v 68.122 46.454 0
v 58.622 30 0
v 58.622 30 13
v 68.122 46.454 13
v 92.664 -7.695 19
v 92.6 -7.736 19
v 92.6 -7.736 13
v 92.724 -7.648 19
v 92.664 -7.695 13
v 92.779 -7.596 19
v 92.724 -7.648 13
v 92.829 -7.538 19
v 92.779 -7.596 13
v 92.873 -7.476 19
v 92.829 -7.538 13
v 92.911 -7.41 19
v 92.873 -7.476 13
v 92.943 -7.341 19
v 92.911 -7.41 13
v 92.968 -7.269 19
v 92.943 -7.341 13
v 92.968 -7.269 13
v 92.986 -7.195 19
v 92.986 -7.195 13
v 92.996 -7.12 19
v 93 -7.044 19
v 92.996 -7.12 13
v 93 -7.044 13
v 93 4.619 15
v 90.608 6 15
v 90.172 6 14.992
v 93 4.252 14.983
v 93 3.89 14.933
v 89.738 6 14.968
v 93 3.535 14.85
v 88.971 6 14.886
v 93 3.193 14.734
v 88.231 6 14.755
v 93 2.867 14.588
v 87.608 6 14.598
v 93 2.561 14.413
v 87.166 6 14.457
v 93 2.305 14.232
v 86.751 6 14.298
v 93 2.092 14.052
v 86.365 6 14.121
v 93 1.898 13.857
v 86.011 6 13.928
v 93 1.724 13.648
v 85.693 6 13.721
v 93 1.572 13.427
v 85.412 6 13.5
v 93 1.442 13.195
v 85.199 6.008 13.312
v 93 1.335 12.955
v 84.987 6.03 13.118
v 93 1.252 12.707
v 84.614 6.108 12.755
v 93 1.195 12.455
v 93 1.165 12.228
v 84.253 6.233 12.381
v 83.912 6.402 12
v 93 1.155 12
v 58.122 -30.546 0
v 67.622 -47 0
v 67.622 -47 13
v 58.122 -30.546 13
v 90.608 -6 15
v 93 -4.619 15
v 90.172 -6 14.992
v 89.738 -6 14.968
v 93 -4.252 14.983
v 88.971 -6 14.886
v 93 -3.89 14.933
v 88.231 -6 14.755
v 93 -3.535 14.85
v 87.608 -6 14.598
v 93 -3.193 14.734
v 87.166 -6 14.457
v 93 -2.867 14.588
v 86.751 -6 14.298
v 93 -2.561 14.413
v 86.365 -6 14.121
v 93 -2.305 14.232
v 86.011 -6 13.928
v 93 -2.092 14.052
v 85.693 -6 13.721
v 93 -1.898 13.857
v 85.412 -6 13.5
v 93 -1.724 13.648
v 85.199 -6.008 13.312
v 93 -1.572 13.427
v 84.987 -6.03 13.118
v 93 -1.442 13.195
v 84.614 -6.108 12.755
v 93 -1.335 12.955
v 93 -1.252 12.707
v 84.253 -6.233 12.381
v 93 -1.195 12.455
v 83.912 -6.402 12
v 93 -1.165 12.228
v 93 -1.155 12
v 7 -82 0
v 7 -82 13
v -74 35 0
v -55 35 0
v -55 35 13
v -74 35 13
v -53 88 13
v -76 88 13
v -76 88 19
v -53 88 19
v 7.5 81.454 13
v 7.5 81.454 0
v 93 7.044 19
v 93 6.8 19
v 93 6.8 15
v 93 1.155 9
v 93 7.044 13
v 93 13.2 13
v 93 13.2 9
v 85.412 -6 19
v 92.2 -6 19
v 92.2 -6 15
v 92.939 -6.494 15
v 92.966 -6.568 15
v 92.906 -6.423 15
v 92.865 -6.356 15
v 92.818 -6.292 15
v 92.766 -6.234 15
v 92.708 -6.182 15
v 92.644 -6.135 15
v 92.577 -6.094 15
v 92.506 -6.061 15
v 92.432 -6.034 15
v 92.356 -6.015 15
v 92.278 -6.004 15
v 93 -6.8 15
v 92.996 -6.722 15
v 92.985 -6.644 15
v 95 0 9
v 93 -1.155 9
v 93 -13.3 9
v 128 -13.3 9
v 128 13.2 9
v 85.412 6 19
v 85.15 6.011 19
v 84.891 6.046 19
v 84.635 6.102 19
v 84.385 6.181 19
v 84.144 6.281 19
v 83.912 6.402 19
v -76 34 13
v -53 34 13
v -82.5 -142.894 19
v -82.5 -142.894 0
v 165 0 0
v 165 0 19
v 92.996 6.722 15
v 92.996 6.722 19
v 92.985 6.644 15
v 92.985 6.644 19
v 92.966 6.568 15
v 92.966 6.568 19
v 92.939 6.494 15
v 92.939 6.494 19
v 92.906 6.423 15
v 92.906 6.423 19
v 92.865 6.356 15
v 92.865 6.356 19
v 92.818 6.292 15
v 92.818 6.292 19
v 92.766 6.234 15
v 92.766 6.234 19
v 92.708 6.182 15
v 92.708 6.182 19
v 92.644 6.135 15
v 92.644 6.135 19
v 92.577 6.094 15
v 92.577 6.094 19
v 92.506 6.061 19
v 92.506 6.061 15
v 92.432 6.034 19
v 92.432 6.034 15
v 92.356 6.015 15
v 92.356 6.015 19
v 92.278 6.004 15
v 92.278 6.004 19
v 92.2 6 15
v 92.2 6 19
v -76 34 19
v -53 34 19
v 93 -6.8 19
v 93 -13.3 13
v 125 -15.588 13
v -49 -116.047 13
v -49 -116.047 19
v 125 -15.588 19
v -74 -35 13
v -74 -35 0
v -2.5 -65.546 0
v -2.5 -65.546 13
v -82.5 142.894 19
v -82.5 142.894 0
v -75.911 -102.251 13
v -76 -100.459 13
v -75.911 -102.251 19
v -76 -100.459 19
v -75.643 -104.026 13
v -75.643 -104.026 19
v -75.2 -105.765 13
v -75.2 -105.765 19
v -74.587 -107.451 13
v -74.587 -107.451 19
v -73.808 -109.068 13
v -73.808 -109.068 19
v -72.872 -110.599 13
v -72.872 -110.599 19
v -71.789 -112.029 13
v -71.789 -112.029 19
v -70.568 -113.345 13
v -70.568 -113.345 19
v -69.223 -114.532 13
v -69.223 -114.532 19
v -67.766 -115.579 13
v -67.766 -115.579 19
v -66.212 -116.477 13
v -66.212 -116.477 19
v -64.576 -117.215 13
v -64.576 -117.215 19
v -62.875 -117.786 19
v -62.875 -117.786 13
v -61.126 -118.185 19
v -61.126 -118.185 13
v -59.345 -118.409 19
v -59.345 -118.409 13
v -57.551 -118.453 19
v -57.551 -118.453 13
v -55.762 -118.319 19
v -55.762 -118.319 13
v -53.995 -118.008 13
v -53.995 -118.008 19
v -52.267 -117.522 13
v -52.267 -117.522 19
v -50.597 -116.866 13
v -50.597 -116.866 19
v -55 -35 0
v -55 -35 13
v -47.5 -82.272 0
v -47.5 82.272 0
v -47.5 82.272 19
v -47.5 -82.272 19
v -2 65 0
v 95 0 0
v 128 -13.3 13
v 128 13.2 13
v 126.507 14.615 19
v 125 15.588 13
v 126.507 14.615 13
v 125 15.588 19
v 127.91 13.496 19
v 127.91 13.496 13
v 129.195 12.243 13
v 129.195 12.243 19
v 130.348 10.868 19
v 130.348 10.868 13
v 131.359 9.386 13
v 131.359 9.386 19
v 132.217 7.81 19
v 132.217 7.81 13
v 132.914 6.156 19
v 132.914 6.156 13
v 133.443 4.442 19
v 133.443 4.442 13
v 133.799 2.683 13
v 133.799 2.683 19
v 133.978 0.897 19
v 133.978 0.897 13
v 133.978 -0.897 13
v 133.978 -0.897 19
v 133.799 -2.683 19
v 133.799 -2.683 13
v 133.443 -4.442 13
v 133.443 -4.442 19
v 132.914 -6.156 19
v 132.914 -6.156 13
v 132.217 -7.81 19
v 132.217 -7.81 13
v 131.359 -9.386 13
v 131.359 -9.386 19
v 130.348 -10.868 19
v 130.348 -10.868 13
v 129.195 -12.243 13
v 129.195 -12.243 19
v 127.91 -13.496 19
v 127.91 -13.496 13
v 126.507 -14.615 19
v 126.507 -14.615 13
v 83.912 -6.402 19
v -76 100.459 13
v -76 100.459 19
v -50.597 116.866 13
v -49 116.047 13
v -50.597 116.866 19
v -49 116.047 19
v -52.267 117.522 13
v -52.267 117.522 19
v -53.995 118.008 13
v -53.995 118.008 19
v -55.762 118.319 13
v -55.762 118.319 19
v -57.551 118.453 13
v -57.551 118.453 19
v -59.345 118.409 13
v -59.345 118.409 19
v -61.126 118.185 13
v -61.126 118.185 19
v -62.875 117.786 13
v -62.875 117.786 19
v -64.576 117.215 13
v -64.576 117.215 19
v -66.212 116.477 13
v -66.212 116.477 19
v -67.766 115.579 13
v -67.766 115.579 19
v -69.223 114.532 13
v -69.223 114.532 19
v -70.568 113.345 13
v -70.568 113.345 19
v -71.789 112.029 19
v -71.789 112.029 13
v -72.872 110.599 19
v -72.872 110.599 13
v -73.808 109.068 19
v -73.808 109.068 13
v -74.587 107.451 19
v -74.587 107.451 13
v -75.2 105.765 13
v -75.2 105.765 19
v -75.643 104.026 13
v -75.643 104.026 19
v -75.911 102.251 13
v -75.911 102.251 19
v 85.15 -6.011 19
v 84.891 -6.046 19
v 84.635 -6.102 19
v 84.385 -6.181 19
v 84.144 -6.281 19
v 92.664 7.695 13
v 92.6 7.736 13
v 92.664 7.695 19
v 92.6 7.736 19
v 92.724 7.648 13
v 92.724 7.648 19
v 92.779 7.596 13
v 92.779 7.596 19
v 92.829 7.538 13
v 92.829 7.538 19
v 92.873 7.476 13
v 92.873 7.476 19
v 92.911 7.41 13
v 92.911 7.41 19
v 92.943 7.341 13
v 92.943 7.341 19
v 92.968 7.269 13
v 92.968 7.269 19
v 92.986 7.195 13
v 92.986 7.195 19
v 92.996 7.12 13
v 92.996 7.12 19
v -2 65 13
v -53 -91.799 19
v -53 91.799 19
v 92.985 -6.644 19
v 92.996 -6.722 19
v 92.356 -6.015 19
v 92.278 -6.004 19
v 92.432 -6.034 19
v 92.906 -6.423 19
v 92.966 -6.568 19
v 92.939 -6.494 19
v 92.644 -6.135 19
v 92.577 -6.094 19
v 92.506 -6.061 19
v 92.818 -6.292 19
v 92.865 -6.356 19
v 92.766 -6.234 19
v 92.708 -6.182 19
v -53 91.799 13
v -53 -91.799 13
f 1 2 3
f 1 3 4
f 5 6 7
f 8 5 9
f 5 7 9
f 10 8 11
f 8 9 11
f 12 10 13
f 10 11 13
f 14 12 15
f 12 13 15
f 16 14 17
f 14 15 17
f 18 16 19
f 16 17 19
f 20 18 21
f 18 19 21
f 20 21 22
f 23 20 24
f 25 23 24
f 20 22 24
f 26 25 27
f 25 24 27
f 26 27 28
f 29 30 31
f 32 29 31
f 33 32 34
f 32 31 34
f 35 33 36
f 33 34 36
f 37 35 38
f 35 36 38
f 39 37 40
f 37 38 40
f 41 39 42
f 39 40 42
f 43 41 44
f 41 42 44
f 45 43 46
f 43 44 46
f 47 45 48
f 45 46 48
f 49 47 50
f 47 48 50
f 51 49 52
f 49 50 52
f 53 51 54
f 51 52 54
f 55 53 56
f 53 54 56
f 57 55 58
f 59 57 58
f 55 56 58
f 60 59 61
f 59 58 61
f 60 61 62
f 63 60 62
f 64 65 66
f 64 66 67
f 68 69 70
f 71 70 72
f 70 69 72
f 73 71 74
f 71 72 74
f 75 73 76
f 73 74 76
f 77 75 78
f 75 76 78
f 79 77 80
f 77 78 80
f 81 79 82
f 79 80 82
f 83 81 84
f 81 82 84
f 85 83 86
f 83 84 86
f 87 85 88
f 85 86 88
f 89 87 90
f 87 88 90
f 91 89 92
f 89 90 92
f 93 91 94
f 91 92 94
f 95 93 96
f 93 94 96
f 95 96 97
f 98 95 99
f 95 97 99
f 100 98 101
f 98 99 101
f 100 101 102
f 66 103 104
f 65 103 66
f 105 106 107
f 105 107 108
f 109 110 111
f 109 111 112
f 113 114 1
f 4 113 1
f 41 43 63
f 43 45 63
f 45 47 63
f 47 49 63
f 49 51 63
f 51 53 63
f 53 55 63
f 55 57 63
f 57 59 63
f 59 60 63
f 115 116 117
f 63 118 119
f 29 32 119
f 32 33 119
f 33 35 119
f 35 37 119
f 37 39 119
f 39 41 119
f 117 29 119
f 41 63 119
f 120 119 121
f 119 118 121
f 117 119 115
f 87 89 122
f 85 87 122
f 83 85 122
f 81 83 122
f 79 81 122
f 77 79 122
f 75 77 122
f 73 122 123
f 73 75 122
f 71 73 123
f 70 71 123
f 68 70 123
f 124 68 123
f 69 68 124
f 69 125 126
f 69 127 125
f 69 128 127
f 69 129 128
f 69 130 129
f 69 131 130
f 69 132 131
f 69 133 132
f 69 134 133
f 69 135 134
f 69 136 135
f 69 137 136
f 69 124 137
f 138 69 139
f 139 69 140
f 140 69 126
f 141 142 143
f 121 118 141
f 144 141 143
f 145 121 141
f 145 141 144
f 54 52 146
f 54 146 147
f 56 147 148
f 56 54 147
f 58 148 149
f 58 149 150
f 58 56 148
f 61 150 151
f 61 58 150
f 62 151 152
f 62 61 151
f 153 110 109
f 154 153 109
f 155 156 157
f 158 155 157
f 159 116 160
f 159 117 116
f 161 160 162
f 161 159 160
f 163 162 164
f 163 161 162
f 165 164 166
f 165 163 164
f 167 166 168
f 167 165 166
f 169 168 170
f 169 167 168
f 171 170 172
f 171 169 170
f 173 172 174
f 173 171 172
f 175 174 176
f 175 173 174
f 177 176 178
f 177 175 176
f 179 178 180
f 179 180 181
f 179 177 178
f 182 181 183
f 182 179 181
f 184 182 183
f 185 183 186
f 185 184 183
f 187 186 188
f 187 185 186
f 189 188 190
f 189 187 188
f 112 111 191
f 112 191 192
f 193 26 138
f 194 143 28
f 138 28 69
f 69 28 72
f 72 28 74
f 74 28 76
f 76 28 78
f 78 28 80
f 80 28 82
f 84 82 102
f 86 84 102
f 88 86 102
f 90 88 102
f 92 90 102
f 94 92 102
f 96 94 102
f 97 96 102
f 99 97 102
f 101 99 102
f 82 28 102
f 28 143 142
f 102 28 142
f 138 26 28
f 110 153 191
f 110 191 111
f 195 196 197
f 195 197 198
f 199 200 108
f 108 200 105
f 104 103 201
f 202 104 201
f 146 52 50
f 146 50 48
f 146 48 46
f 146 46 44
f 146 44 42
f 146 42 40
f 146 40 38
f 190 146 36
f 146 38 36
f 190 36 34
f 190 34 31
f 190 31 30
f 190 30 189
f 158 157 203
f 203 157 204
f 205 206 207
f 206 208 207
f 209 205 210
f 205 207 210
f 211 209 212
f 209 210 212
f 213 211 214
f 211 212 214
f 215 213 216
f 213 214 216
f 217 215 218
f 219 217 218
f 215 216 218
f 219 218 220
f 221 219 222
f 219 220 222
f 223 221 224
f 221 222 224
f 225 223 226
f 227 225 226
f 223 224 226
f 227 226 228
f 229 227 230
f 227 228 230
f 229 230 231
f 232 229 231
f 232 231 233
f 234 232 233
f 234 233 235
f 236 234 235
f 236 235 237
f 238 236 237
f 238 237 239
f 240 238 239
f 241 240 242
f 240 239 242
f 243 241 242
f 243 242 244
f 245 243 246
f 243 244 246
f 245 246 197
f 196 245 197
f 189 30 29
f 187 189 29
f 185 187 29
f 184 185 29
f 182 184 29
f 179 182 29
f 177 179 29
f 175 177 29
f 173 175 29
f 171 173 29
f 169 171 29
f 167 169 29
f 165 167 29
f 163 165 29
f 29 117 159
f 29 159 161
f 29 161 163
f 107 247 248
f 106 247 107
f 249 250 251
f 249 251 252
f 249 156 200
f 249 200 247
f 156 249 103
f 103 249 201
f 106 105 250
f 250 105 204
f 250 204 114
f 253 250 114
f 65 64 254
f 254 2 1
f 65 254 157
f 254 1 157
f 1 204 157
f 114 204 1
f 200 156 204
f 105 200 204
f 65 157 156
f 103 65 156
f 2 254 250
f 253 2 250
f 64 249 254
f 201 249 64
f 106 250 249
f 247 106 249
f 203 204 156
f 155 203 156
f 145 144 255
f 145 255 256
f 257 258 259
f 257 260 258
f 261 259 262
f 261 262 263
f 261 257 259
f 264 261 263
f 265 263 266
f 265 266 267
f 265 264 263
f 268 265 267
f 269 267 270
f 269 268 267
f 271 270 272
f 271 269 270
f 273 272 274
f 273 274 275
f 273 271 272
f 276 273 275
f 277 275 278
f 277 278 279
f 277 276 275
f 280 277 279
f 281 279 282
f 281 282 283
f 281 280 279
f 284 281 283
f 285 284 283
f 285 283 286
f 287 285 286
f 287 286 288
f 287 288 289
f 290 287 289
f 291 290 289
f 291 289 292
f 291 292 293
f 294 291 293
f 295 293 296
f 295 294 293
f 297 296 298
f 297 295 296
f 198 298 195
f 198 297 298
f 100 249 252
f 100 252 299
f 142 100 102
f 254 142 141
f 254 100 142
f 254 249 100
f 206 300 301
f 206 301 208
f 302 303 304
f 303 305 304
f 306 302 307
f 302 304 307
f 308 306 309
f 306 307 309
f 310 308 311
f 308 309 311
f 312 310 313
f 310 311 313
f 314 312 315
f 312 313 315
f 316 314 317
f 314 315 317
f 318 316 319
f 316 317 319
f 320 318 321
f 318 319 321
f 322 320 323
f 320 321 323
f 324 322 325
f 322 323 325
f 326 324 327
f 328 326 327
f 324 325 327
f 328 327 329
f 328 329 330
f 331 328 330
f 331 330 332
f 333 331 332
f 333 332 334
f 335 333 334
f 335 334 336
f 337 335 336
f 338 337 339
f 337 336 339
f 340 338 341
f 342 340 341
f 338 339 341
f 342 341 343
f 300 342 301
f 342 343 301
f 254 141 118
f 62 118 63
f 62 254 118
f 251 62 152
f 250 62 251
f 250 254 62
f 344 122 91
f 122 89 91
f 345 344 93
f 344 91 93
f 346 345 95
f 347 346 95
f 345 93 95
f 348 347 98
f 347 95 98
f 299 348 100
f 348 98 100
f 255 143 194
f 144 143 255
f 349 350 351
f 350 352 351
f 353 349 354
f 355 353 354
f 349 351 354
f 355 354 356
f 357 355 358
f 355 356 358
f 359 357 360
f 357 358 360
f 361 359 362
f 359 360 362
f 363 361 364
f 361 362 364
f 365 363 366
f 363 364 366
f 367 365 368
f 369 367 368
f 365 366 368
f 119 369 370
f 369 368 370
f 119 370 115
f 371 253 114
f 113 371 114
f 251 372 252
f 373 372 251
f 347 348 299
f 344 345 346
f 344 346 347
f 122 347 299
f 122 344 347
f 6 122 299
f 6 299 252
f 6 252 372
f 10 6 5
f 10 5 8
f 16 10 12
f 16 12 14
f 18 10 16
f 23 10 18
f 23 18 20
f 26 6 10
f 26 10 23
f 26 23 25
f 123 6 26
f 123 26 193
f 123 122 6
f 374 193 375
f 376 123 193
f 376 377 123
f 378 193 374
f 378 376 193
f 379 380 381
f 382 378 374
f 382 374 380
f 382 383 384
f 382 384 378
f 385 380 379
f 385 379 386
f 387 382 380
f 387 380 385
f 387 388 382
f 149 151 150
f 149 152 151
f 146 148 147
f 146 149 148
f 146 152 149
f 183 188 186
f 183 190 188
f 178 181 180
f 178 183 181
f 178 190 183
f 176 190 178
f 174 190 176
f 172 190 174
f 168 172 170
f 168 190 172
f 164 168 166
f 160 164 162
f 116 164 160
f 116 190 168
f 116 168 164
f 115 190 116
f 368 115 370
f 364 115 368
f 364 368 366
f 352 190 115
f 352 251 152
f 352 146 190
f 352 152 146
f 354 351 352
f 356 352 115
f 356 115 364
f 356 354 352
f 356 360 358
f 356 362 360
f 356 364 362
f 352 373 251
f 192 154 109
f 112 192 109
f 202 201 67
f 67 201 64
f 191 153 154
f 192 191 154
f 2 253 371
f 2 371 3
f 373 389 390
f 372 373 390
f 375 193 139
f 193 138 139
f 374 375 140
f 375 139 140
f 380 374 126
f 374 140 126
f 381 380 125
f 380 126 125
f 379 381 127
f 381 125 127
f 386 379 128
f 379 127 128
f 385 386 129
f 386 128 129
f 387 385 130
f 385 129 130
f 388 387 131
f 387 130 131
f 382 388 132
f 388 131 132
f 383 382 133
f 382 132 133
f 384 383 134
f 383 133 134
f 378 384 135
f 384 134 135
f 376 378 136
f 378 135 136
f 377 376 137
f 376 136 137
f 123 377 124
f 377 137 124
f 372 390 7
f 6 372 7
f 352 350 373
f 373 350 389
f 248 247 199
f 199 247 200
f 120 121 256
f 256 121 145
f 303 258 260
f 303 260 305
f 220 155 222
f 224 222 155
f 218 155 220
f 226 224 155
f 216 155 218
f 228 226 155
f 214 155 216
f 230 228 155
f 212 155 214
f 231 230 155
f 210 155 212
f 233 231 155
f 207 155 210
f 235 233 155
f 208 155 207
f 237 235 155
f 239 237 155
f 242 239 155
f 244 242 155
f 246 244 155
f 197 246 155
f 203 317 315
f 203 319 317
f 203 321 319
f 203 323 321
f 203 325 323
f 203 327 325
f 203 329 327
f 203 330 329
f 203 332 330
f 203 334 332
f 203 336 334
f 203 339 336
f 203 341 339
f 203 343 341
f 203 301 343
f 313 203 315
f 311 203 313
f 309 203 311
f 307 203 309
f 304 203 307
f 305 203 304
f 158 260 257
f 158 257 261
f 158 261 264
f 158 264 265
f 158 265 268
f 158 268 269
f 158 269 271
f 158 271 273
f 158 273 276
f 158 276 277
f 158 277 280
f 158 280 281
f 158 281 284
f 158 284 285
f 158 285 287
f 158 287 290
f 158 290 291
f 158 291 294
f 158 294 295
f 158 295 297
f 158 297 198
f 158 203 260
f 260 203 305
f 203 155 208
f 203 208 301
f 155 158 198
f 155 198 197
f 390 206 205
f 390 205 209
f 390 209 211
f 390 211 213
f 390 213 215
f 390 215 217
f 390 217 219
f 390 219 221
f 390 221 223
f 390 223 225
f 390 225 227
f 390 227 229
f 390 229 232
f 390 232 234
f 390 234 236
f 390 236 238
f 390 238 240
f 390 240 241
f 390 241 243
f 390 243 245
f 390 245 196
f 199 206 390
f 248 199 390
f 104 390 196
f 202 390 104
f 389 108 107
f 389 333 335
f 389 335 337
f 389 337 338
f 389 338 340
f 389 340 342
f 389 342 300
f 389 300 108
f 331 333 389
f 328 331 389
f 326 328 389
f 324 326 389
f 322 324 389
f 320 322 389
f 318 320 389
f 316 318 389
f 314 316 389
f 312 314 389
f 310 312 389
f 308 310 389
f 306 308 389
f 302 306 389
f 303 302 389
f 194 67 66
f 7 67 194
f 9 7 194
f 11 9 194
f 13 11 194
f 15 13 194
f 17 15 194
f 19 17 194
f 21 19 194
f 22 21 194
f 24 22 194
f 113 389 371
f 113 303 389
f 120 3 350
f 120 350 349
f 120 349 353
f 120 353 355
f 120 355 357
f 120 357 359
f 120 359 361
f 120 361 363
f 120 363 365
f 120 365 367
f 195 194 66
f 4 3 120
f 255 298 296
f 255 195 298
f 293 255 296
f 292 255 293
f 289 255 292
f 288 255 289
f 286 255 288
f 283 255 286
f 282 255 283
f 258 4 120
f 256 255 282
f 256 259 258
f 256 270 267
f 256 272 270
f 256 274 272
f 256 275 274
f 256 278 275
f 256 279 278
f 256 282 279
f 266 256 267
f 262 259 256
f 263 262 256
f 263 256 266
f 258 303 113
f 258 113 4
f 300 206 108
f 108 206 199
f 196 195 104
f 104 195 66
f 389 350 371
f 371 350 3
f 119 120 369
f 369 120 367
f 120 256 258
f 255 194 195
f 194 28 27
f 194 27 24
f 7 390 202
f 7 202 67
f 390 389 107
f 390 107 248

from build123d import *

# Parameters (mm, degrees)
BOX005_W               = 23
BOX005_H               = 54
BOX005_DEPTH           = 6
PRISM003_DEPTH         = 6
PRISM002_DEPTH         = 6
BOX004_W               = 10
BOX004_H               = 12
BOX004_DEPTH           = 4
BOX003_W               = 35
BOX003_H               = 26.5
BOX003_DEPTH           = 10
BOX002_W               = 70
BOX002_H               = 19
BOX002_DEPTH           = 19
BOX002_PLACEMENT_ANGLE = 30
BOX001_W               = 70
BOX001_H               = 19
BOX001_DEPTH           = 19
BOX001_PLACEMENT_ANGLE = 90
BOX_W                  = 70
BOX_H                  = 19
BOX_DEPTH              = 19
BOX_PLACEMENT_ANGLE    = 30
PRISM001_DEPTH         = 19
PRISM_DEPTH            = 19
FILLET_R               = 18
FILLET001_R            = 0.8
FILLET002_R            = 3


with BuildPart() as box005:
    # Box005 → Box005 (new body)
    with BuildSketch(Plane(origin=(-76, 34, 13), x_dir=(1, 0, 0), z_dir=(0, 0, 1))):
        with Locations((11.5, 27)):
            Rectangle(BOX005_W, BOX005_H)
    extrude(amount=BOX005_DEPTH)


with BuildPart() as prism003:
    # Prism003 → Prism003 (new body)
    with BuildSketch(Plane.XY.offset(13)):
        Polygon((106, 0), (-53, 91.798693), (-53, -91.798693), align=None)
    extrude(amount=PRISM003_DEPTH)


with BuildPart() as cut006:
    # Prism002 → Prism002 (new body)
    with BuildSketch(Plane.XY.offset(13)):
        Polygon((152, 0), (-76, 131.635861), (-76, -131.635861), align=None)
    extrude(amount=PRISM002_DEPTH)

    # Cut006: cut Prism003
    add(prism003.part, mode=Mode.SUBTRACT)


with BuildPart() as box004:
    # Box004 → Box004 (new body)
    with BuildSketch(Plane(origin=(84, -6, 15), x_dir=(1, 0, 0), z_dir=(0, 0, 1))):
        with Locations((5, 6)):
            Rectangle(BOX004_W, BOX004_H)
    extrude(amount=BOX004_DEPTH)


with BuildPart() as box003:
    # Box003 → Box003 (new body)
    with BuildSketch(Plane(origin=(93, -13.3, 9), x_dir=(1, 0, 0), z_dir=(0, 0, 1))):
        with Locations((17.5, 13.25)):
            Rectangle(BOX003_W, BOX003_H)
    extrude(amount=BOX003_DEPTH)


with BuildPart() as box002:
    # Box002 → Box002 (new body)
    with BuildSketch(Plane.XY):
        with Locations((35, 9.5)):
            Rectangle(BOX002_W, BOX002_H)
    extrude(amount=BOX002_DEPTH)


with BuildPart() as box002_1:
    # Box002 placement: moved
    add(box002.part.moved(Location((7, -82, 0))).rotate(Axis((7, -82, 0), (0, 0, 1)), BOX002_PLACEMENT_ANGLE))


with BuildPart() as box001:
    # Box001 → Box001 (new body)
    with BuildSketch(Plane.XY):
        with Locations((35, 9.5)):
            Rectangle(BOX001_W, BOX001_H)
    extrude(amount=BOX001_DEPTH)


with BuildPart() as box001_1:
    # Box001 placement: moved
    add(box001.part.moved(Location((-55, -35, 0))).rotate(Axis((-55, -35, 0), (0, 0, 1)), BOX001_PLACEMENT_ANGLE))


with BuildPart() as box:
    # Box → Box (new body)
    with BuildSketch(Plane.XY):
        with Locations((35, 9.5)):
            Rectangle(BOX_W, BOX_H)
    extrude(amount=BOX_DEPTH)


with BuildPart() as box_1:
    # Box placement: moved
    add(box.part.moved(Location((-2, 65, 0))).rotate(Axis((-2, 65, 0), (0, 0, -1)), BOX_PLACEMENT_ANGLE))


with BuildPart() as prism001:
    # Prism001 → Prism001 (new body)
    with BuildSketch(Plane.XY):
        Polygon((95, 0), (-47.5, 82.272413), (-47.5, -82.272413), align=None)
    extrude(amount=PRISM001_DEPTH)


with BuildPart() as fillet002:
    # Prism → Prism (new body)
    with BuildSketch(Plane.XY):
        Polygon((165, 0), (-82.5, 142.894192), (-82.5, -142.894192), align=None)
    extrude(amount=PRISM_DEPTH)

    # Cut: cut Prism001
    add(prism001.part, mode=Mode.SUBTRACT)

    # Cut001: cut Box
    add(box_1.part, mode=Mode.SUBTRACT)

    # Cut002: cut Box001
    add(box001_1.part, mode=Mode.SUBTRACT)

    # Cut003: cut Box002
    add(box002_1.part, mode=Mode.SUBTRACT)

    # Cut004: cut Box003
    add(box003.part, mode=Mode.SUBTRACT)

    # Cut005: cut Box004
    add(box004.part, mode=Mode.SUBTRACT)

    # Cut007: cut Cut006
    add(cut006.part, mode=Mode.SUBTRACT)

    # Fillet
    fillet_edges = [fillet002.edges().sort_by_distance(p)[0] for p in [
        (-76, 131.635861, 16),
        (-76, -131.635861, 16),
        (152, 0, 16),
    ]]
    fillet(fillet_edges, radius=FILLET_R)

    # Fillet001
    fillet001_edges = [fillet002.edges().sort_by_distance(p)[0] for p in [
        (93, 7.505553, 16),
        (93, 6, 17),
        (93, -6, 17),
        (93, -7.505553, 16),
    ]]
    fillet(fillet001_edges, radius=FILLET001_R)

    # Fillet002
    fillet002_edges = [fillet002.edges().sort_by_distance(p)[0] for p in [
        (88.803848, 3.57735, 15),
        (84.607695, 6, 17),
        (88.803848, -3.57735, 15),
        (84.607695, -6, 17),
    ]]
    fillet(fillet002_edges, radius=FILLET002_R)


solid = Compound([box005.part, fillet002.part])
